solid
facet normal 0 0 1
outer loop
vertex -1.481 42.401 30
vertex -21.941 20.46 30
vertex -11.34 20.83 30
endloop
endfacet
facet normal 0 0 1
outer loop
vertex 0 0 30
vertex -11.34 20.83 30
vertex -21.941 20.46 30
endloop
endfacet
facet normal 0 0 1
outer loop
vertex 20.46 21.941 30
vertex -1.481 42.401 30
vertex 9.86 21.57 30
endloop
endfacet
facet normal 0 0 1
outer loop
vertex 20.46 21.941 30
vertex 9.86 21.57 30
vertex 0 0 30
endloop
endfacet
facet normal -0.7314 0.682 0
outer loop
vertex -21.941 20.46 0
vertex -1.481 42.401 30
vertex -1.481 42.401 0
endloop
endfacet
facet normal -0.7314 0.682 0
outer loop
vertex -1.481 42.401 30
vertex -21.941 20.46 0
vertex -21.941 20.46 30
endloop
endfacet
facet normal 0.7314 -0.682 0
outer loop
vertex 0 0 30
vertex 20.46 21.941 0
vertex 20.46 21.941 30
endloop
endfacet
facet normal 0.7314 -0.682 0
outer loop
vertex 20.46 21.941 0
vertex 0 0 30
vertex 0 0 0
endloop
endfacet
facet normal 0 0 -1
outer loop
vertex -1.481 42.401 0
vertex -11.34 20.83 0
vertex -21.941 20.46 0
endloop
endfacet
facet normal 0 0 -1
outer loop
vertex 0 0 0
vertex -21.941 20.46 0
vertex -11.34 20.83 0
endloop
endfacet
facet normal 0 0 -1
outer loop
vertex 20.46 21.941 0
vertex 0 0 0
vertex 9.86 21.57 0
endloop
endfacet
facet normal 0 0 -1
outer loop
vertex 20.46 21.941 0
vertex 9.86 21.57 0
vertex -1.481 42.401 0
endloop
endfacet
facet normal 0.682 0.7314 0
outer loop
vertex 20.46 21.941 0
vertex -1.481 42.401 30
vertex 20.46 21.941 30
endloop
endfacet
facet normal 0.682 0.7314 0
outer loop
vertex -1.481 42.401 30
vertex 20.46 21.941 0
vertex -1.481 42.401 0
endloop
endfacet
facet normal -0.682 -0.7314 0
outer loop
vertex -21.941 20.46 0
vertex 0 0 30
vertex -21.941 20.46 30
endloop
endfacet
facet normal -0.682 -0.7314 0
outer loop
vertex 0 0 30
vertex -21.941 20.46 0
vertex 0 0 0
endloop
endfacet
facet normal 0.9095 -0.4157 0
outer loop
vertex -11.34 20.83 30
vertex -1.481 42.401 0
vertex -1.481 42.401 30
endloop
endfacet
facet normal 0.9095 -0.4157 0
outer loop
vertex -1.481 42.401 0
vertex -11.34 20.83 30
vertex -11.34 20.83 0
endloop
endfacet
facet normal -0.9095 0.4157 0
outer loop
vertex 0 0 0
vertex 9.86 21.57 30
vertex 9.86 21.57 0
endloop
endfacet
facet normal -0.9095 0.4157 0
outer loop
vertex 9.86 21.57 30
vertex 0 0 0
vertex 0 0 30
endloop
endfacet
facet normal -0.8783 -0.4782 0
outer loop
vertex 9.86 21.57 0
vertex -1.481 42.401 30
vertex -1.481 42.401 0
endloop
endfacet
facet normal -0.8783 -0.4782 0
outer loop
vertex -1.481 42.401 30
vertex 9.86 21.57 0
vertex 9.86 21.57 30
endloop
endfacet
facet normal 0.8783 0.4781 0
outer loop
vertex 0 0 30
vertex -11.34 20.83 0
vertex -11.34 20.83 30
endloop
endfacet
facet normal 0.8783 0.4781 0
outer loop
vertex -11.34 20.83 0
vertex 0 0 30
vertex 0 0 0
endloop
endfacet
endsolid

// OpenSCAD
rotate([0,0,2])
rotate([0,-90,0]){
    difference(){
        rotate([-45,0,0]) {
            cube([30, 30, 30]);
        }
        scale([1,1,0.5]) {
            rotate([-45,0,0]) {
                cube([30, 30, 30]);
            }
        }
    }
}
